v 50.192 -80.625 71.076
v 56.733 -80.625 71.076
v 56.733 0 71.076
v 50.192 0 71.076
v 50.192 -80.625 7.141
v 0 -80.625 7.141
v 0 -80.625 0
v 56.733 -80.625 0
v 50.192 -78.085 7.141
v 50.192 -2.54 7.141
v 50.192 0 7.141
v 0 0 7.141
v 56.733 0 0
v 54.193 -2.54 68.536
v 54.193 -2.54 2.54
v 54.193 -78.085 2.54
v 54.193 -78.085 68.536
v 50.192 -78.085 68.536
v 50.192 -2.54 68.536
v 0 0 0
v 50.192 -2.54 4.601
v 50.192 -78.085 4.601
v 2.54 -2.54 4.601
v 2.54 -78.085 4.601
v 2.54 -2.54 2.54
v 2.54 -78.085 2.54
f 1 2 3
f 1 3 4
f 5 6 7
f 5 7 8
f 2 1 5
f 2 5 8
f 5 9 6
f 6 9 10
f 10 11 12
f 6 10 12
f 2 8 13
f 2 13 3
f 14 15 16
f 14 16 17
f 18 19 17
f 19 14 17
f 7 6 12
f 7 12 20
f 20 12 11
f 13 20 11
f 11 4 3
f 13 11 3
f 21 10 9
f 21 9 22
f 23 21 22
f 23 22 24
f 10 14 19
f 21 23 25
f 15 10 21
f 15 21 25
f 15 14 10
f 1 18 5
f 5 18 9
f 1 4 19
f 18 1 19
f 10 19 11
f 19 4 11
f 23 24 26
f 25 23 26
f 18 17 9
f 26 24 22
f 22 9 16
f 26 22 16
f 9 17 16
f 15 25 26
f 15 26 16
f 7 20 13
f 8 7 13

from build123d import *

# Parameters (mm, degrees)
F1_DEPTH = 80.625
F2_T     = -2.54


# Not quite as in the source:
# - a shell that OpenCascade refuses in one call is made with other operations: the cavity is built on its own and cut out


with BuildPart() as f1:
    # F0 (on Front) → F1 (new body)
    with BuildSketch(Plane.XZ):
        Polygon((0, 7.1409749798), (0, 0), (56.7328892648, 0), (56.7328892648, 71.0757300258), (50.1917116344, 71.0757300258), (50.1917116344, 7.1409749798), align=None)
    extrude(amount=F1_DEPTH)

    # F2: a shell. OpenCascade refuses it in one call, so the cavity is built on its own and cut out:
    # the body offset inwards by the wall thickness, plus a prism from it out through each open face.
    f2_core = offset(f1.part, amount=F2_T, kind=Kind.INTERSECTION, mode=Mode.PRIVATE)
    f2_exits = [f2_core.faces().sort_by_distance(p)[0] for p in [
        (52.731712, -40.3125, 36.568353),
    ]]
    add(f2_core, mode=Mode.SUBTRACT)
    extrude(f2_exits, amount=-F2_T, mode=Mode.SUBTRACT)


solid = f1.part
